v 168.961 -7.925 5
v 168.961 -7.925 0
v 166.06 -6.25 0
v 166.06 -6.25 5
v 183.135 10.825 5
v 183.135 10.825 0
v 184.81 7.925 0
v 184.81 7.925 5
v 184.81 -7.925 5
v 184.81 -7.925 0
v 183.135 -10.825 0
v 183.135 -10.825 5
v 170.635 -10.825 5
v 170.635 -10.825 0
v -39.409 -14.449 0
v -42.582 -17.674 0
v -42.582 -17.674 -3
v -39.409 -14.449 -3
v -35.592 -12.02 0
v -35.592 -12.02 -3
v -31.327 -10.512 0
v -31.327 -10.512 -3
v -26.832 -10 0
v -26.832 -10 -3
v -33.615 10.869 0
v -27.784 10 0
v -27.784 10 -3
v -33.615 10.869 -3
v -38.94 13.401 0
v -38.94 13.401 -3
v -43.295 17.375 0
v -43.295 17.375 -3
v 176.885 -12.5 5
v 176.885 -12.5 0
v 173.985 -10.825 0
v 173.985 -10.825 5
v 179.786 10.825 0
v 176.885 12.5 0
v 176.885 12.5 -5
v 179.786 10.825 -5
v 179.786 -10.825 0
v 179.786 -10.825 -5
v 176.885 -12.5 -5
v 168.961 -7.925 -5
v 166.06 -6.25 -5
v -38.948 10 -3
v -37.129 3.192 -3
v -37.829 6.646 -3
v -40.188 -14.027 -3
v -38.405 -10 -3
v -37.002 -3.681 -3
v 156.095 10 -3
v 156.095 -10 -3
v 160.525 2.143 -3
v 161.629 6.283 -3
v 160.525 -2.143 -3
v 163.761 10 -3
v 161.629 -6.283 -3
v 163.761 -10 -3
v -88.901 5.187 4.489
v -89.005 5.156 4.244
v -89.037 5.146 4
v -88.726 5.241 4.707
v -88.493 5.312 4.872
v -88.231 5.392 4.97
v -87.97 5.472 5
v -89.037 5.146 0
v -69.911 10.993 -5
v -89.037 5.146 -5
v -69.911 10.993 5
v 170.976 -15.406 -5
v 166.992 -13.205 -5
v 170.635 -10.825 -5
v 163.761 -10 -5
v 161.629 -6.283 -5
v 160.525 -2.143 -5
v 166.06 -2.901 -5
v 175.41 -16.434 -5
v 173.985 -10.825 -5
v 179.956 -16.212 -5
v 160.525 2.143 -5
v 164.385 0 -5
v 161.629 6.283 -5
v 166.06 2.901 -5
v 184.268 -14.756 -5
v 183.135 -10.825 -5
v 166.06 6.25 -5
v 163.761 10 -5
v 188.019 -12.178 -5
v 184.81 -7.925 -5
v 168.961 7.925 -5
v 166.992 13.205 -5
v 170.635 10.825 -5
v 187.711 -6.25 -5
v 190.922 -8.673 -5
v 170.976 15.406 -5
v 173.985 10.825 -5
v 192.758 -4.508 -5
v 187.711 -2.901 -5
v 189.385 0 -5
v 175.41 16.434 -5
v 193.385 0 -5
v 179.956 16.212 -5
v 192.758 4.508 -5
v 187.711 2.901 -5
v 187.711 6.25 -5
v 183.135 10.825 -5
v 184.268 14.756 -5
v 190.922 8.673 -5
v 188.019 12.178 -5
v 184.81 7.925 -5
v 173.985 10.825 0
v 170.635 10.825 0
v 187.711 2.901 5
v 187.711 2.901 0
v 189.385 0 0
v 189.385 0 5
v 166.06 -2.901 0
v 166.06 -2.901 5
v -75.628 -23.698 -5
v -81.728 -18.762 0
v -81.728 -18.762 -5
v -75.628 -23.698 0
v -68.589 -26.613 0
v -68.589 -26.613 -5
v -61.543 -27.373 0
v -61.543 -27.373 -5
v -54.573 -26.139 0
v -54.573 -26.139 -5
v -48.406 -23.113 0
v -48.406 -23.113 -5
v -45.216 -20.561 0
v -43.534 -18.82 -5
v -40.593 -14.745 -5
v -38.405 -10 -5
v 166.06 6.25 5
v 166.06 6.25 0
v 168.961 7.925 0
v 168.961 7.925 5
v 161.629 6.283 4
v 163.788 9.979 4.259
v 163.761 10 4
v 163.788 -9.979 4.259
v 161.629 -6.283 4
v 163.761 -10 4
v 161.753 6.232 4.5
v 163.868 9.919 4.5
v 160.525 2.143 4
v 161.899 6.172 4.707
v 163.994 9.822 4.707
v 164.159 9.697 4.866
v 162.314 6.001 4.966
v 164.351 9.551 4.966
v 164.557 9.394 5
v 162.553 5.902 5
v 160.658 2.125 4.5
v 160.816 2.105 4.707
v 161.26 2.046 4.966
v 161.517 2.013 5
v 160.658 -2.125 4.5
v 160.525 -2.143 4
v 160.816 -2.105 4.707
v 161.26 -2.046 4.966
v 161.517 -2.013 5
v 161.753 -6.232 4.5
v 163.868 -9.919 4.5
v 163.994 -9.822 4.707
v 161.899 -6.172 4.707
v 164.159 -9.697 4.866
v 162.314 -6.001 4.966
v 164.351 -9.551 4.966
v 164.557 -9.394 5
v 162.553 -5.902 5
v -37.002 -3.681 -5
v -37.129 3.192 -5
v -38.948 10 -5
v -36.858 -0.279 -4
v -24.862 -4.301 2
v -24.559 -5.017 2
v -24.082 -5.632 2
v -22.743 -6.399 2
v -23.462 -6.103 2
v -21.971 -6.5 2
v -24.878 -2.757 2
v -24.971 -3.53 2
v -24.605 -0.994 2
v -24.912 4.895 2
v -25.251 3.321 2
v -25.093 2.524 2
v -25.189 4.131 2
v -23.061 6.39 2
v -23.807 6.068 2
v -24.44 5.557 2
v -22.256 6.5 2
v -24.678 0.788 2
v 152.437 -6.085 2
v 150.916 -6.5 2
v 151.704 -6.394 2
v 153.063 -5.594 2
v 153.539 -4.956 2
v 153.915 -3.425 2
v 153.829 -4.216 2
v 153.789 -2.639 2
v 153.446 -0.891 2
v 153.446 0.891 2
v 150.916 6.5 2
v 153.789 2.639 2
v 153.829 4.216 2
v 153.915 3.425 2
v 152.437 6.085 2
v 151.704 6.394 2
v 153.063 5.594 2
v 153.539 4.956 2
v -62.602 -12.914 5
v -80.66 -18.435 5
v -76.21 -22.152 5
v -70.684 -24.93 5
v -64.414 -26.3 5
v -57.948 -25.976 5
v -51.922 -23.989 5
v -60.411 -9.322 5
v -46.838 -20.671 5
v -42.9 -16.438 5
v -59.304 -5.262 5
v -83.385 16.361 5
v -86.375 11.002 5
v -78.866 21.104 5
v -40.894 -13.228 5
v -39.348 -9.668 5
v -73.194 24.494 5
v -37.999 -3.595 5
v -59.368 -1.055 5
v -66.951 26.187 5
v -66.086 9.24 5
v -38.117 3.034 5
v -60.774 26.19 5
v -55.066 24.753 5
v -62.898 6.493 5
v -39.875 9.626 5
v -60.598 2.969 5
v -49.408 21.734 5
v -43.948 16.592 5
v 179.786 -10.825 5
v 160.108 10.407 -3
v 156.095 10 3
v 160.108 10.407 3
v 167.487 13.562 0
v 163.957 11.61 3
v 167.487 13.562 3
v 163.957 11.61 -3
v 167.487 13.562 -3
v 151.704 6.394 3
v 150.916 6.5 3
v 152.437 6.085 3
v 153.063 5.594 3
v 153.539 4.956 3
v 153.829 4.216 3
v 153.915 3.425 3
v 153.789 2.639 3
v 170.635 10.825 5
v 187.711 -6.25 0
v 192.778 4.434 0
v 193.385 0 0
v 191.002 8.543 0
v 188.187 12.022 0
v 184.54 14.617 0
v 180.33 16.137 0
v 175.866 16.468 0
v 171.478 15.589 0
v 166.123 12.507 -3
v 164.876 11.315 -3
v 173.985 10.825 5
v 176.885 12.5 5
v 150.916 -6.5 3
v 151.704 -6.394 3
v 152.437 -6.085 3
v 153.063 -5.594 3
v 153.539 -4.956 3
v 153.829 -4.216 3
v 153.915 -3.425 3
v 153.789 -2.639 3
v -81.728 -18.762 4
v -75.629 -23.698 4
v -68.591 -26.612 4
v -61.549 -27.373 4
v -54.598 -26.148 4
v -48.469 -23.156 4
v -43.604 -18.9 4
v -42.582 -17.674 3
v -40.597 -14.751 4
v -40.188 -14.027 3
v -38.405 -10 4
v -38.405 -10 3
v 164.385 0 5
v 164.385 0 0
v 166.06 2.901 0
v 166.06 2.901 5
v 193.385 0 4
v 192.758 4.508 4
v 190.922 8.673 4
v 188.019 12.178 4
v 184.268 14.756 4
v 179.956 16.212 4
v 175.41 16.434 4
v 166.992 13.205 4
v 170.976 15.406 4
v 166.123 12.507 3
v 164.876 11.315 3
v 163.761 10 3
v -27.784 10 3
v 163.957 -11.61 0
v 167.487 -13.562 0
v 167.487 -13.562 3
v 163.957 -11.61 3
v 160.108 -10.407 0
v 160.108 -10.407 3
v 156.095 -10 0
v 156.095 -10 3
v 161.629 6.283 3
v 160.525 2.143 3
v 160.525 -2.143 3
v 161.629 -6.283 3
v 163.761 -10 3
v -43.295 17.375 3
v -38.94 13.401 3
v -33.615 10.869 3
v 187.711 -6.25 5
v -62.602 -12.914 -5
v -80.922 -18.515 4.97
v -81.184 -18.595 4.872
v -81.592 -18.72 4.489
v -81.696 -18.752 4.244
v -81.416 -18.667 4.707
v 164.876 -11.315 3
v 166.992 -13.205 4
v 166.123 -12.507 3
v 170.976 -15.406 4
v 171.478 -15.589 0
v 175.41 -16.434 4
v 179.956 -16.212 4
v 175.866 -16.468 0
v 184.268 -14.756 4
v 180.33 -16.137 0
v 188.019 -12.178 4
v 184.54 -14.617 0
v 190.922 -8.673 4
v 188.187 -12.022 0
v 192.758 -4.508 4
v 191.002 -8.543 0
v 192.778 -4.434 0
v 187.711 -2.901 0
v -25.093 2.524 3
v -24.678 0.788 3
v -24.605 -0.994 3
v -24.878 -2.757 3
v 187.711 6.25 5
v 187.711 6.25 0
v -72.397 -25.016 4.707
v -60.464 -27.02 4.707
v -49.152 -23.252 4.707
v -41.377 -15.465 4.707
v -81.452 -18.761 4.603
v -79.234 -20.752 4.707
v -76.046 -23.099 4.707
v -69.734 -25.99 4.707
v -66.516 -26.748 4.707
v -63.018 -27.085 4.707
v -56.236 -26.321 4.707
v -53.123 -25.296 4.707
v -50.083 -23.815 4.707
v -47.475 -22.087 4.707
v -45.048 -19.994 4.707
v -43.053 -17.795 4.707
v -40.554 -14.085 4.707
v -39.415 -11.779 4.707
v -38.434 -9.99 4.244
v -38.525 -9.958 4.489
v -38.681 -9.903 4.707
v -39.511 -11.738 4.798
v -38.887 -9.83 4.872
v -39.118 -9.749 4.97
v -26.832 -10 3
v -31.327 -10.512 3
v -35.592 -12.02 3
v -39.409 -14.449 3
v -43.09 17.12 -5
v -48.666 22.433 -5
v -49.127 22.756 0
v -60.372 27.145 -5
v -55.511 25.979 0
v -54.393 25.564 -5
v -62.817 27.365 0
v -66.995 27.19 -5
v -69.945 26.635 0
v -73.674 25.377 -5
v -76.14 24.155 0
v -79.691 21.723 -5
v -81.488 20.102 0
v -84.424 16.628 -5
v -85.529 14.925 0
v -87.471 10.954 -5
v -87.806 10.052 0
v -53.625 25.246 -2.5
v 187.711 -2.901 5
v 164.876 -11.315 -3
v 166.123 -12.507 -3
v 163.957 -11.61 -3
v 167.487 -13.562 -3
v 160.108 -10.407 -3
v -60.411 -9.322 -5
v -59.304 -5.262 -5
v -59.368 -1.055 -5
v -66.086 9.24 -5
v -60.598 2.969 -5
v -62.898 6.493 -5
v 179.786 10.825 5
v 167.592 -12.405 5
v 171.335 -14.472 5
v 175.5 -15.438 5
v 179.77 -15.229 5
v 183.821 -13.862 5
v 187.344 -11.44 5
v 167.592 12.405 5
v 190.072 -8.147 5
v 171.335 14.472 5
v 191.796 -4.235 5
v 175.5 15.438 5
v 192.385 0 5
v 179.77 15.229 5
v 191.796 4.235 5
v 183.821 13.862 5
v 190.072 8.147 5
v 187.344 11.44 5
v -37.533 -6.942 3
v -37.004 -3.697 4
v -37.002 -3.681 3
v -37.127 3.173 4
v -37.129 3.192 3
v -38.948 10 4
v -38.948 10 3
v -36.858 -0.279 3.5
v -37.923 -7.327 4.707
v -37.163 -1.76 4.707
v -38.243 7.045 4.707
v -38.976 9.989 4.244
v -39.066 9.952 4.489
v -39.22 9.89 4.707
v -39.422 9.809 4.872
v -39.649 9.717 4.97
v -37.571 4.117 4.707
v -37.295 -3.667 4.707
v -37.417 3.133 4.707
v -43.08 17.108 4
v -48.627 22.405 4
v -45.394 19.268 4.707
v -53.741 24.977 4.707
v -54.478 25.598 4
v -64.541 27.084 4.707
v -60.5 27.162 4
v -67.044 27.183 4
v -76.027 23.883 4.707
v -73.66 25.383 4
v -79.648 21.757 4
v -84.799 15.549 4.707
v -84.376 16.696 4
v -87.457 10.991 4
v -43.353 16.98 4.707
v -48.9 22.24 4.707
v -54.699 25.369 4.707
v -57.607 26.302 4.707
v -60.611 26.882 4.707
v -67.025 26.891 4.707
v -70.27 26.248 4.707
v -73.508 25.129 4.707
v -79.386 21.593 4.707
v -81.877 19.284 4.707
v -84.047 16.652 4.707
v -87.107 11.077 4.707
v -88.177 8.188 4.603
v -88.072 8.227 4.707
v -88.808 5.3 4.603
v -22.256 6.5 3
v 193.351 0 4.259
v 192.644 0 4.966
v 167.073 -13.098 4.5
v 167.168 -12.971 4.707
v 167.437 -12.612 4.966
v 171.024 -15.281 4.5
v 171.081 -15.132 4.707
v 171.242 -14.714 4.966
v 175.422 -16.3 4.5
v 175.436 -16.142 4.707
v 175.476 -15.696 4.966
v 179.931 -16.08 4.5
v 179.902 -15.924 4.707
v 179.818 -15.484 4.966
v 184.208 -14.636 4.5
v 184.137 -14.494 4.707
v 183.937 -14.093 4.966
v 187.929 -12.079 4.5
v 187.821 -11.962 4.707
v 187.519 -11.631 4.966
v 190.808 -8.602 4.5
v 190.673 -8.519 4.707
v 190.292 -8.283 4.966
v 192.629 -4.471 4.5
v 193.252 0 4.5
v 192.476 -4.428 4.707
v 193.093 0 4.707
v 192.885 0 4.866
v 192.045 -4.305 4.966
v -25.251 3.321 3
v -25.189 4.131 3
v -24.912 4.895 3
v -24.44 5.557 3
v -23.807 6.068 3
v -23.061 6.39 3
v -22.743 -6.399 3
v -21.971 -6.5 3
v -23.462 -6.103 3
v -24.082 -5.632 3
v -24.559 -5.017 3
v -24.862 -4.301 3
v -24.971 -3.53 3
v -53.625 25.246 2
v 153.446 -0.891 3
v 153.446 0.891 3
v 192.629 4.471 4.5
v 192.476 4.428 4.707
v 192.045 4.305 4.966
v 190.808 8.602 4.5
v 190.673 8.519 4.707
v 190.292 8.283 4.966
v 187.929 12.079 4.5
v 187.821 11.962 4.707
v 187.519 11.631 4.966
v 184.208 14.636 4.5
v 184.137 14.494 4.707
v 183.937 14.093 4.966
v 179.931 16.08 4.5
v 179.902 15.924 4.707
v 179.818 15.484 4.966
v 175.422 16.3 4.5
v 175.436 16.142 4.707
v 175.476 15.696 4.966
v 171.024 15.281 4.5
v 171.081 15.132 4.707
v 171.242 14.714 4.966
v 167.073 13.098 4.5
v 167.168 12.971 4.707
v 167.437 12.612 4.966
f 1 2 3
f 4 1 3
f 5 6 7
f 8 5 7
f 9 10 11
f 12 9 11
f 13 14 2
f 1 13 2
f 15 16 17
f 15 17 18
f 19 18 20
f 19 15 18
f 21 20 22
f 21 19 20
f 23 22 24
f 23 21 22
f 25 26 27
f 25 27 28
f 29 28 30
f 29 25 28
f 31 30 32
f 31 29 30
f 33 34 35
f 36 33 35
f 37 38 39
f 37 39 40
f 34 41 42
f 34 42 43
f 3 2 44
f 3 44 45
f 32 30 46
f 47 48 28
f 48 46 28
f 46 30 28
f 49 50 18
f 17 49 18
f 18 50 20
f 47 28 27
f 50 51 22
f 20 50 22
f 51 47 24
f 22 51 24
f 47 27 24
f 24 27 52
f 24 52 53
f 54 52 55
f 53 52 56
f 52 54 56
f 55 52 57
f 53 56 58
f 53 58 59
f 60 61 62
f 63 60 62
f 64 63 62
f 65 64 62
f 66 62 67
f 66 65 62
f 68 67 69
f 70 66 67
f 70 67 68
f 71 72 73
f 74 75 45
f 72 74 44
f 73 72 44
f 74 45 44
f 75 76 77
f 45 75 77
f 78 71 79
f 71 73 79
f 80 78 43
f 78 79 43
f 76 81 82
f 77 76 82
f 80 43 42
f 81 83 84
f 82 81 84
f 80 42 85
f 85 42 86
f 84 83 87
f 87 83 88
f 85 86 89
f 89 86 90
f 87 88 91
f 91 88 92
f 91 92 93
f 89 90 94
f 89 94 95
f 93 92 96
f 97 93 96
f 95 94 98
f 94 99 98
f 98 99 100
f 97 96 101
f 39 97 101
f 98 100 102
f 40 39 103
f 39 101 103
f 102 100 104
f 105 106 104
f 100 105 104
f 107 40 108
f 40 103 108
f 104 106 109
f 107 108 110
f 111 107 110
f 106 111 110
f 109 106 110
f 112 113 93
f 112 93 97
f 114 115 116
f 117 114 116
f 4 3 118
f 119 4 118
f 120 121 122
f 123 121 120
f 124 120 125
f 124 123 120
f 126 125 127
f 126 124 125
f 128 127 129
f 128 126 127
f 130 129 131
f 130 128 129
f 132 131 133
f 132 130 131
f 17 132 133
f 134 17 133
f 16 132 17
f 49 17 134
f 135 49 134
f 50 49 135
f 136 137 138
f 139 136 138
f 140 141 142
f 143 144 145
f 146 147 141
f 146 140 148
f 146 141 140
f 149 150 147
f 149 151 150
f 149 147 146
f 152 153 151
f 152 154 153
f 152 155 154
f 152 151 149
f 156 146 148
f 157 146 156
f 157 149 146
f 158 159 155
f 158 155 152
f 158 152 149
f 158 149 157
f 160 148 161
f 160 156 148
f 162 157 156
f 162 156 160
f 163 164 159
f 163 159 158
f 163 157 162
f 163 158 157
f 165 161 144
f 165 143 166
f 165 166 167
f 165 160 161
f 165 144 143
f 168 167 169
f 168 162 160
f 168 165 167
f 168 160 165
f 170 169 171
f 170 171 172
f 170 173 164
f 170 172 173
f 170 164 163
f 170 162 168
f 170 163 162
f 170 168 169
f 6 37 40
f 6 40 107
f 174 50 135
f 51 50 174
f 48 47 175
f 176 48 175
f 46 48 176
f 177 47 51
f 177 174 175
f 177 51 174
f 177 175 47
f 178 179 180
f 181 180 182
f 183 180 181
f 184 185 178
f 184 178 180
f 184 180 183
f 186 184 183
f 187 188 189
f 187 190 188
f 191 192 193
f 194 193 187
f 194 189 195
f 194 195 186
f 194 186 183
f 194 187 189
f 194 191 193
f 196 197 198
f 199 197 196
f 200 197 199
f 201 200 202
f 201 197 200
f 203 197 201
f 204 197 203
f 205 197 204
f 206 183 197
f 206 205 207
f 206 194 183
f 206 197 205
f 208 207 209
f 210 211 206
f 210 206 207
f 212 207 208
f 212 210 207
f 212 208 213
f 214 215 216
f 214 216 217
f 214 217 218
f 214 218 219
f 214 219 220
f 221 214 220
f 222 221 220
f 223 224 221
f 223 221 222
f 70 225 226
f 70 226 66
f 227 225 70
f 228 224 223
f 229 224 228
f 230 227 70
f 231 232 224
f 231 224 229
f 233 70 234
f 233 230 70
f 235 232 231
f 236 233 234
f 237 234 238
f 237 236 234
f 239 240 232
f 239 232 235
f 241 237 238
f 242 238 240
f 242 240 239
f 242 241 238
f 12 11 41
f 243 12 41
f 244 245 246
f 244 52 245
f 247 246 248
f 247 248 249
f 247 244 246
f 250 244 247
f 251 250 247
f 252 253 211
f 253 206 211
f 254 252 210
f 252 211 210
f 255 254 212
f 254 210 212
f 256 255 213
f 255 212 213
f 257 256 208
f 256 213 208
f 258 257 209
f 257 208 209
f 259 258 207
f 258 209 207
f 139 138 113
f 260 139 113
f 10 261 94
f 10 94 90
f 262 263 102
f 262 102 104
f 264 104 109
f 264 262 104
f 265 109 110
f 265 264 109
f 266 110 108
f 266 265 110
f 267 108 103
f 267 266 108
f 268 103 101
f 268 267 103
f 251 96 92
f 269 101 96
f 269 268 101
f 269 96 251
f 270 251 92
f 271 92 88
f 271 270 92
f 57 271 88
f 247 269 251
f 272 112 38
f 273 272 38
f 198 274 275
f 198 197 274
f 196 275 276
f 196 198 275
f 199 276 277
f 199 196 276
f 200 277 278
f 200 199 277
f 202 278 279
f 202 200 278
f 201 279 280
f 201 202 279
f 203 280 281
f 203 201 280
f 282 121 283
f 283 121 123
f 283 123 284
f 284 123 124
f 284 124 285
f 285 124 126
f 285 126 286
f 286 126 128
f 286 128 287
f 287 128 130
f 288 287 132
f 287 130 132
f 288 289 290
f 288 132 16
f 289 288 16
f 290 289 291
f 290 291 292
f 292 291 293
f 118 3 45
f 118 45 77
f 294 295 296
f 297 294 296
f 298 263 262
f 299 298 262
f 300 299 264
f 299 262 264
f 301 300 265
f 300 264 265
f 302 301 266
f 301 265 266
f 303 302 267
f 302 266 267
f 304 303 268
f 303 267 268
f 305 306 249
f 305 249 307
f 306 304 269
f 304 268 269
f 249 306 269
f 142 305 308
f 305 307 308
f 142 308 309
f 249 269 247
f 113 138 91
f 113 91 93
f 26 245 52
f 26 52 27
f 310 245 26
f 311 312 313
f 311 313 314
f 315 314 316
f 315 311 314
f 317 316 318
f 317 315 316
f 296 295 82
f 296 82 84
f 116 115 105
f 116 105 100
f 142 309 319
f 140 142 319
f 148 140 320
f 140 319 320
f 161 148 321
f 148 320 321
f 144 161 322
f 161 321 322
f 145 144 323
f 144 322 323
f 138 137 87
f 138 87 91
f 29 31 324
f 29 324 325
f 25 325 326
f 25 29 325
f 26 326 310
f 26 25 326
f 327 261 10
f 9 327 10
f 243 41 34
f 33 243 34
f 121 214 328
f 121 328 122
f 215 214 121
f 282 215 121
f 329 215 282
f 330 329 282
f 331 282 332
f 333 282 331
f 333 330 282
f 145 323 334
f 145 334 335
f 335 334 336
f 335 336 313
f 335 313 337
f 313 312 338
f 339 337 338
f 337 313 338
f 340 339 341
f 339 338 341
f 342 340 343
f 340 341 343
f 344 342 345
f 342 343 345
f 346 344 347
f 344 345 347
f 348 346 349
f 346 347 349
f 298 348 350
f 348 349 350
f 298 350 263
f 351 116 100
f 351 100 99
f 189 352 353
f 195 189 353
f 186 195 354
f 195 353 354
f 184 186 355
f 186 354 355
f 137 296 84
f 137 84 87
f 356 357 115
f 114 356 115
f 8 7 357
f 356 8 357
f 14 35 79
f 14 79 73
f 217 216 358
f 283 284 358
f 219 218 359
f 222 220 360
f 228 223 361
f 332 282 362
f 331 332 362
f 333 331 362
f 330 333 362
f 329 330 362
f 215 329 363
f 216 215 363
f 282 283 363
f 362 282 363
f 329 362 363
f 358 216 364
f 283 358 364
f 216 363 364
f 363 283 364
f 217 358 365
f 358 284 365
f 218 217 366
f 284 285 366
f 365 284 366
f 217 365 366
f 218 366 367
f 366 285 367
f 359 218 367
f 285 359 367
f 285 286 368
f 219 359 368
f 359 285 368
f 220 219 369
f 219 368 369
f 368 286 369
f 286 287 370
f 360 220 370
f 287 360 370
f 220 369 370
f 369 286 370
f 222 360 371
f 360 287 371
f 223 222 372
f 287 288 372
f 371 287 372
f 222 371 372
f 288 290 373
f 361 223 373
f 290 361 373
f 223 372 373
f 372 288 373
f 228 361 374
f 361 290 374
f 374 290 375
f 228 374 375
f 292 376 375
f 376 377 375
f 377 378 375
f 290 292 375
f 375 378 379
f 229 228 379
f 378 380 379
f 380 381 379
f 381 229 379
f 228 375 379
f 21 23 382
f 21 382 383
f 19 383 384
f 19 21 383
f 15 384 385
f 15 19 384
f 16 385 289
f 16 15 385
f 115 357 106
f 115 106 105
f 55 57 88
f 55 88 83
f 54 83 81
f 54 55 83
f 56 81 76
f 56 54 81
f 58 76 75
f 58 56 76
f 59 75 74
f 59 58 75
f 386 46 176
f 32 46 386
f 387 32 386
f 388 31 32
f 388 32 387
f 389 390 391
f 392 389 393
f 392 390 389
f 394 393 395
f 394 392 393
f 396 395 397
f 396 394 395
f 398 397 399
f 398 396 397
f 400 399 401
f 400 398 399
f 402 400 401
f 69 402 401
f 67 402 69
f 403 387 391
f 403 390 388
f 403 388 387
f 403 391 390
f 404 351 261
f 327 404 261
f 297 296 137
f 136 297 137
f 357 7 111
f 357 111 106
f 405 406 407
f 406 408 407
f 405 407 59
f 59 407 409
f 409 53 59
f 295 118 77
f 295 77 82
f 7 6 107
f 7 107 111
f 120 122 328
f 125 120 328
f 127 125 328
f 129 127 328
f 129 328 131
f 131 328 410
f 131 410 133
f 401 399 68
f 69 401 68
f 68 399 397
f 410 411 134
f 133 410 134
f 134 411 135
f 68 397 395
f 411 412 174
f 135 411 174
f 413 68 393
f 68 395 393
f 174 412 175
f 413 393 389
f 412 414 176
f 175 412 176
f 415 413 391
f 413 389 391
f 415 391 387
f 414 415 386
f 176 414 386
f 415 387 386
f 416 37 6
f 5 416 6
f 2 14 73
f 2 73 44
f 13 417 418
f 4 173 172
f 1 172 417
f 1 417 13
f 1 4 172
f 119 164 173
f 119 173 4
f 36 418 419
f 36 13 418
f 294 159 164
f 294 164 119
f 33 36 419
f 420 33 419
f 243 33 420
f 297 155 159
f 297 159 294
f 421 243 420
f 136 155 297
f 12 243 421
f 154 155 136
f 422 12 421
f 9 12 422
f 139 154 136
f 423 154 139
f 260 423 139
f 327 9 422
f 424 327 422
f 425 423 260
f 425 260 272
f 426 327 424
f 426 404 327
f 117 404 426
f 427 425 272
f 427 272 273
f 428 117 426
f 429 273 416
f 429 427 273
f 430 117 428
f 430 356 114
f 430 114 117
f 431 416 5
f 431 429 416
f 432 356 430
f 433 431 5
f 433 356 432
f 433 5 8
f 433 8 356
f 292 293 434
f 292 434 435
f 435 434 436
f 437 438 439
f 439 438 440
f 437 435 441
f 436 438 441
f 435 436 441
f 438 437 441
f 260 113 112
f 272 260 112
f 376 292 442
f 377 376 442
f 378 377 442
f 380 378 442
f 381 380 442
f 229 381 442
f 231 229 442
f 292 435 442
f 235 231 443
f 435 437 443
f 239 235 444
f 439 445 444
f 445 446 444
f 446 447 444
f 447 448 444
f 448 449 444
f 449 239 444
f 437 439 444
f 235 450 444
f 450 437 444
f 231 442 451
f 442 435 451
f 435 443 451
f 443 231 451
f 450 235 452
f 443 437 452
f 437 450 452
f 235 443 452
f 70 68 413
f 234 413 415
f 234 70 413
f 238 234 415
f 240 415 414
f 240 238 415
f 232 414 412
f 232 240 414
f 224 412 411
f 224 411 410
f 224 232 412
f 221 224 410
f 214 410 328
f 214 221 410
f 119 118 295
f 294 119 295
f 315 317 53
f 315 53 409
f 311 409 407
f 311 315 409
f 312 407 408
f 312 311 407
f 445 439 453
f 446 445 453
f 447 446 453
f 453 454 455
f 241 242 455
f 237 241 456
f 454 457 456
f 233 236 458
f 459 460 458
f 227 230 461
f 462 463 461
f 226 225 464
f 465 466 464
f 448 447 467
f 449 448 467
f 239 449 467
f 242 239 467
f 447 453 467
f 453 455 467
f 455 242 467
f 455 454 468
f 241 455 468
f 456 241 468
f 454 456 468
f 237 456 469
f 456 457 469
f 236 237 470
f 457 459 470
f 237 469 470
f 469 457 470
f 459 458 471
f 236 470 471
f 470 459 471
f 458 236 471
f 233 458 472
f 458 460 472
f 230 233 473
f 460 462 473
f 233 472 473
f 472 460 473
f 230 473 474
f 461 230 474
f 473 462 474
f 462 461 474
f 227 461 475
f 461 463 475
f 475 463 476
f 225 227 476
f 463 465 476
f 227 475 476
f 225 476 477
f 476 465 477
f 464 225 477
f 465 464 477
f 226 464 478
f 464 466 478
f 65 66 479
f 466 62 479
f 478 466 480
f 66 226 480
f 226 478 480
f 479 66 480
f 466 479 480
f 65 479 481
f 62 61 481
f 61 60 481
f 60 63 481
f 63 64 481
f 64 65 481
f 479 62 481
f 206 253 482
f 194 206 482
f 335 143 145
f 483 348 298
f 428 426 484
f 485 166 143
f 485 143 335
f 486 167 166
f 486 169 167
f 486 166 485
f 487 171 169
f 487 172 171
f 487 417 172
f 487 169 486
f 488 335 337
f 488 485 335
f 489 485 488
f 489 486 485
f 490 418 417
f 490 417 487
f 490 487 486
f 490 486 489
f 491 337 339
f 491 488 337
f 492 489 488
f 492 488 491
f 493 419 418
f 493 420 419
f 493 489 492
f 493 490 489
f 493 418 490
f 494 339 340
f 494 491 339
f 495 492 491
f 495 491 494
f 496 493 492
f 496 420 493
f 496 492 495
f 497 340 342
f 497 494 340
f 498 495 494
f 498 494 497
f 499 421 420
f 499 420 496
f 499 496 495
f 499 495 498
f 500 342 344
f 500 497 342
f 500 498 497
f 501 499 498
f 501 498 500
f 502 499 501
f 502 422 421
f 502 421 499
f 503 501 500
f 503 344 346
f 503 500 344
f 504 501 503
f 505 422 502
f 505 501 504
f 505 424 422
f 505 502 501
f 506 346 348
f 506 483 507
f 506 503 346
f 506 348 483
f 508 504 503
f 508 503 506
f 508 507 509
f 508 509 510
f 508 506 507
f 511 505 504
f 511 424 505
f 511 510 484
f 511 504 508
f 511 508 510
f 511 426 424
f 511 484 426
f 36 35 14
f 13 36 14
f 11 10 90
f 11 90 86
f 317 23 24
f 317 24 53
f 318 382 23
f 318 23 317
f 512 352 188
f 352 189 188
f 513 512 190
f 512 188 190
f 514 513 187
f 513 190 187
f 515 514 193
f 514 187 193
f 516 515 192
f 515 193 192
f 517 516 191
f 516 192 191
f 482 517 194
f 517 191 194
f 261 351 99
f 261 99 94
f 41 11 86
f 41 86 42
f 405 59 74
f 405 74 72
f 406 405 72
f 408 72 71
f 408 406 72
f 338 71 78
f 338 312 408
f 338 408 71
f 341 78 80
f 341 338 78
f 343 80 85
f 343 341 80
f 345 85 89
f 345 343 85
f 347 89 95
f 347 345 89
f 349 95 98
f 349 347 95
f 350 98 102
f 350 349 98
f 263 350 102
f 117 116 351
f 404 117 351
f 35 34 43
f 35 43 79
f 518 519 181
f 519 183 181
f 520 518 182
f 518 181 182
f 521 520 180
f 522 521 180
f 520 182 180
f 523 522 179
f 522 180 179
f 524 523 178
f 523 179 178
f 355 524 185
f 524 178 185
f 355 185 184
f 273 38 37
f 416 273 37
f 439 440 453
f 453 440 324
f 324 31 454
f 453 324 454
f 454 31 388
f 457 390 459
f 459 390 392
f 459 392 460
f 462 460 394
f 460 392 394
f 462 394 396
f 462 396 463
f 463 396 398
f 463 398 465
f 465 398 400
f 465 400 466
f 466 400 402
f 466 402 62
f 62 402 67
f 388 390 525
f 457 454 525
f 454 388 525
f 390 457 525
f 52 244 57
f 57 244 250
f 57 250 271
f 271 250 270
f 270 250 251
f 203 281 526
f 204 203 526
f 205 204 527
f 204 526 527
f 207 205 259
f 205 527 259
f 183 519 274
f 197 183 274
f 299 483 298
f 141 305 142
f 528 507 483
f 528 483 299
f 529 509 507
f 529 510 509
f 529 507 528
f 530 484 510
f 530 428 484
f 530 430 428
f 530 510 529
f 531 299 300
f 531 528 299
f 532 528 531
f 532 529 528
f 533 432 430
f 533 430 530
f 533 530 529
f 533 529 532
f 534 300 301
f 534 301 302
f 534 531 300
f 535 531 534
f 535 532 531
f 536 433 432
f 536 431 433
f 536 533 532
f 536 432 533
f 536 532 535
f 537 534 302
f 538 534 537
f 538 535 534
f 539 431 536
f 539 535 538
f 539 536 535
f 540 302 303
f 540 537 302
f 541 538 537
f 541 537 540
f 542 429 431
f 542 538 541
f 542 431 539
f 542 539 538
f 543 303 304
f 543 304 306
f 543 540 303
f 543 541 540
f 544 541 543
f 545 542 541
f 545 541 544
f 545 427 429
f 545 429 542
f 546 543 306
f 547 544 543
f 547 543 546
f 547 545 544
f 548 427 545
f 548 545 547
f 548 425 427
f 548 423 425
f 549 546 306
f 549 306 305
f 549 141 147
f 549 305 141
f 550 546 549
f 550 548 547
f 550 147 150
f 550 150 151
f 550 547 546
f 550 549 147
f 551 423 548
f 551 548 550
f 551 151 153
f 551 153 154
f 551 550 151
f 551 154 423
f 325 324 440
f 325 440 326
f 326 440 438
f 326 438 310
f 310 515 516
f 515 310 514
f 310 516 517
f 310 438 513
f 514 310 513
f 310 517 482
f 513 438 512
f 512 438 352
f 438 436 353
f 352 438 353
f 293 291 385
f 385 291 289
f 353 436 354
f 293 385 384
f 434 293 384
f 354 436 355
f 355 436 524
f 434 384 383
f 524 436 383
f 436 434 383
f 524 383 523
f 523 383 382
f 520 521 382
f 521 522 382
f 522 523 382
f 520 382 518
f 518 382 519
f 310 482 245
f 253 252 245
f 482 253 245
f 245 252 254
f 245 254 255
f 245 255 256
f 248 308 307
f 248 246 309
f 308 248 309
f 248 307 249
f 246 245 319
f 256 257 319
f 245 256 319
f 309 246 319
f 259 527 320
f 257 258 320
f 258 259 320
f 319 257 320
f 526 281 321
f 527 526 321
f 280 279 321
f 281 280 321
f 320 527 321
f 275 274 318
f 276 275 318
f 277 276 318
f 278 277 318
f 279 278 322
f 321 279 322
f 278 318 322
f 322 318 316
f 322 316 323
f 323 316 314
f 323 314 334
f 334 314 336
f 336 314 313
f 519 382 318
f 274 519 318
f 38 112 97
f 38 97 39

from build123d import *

# Parameters (mm, degrees)
BOSS_EXTRUDE1_DEPTH   = 5
BOSS_EXTRUDE1_2_DEPTH = 5
BOSS_EXTRUDE2_DEPTH   = 3
FILLET1_R             = 20
FILLET2_R             = 20
CUT_EXTRUDE2_DEPTH    = 1
FILLET3_R             = 3
FILLET4_R             = 1


with BuildPart() as part:
    # Sketch1 → Boss-Extrude1 (new, symmetric)
    with BuildSketch(Plane.XY):
        with BuildLine():
            Line((-89.037246537, 5.145771556), (-69.911151418, 10.99320565))
            ThreePointArc((-69.911151418, 10.99320565), (-59.841193921, 1.000753662), (-62.6018588, -12.914413249))
            Line((-62.6018588, -12.914413249), (-81.727953919, -18.761847343))
            add(Edge.make_bspline(
                [(-81.727953919, -18.761847343), (-58.860884109, -43.388050907), (-41.130092768, -15.622946309), (-39.447011057, -12.987365142), (-38.405002213, -10)],
                knots=[2.042658164, 2.042658164, 2.042658164, 3.822478708, 3.822478708, 4.076668665, 4.076668665, 4.076668665], degree=2, weights=[1, 0.629481749, 1, 0.947083419, 0.909281691]))
            add(Edge.make_bspline(
                [(-38.405002213, -10), (-34.916949048, 0), (-38.94800166, 10)],
                knots=[4.076668665, 4.076668665, 4.076668665, 4.797306531, 4.797306531, 4.797306531], degree=2, weights=[0.909281691, 0.802112405, 0.816427746]))
            add(Edge.make_bspline(
                [(-38.94800166, 10), (-43.286972227, 20.763864888), (-53.624843095, 25.245540515), (-83.850384762, 38.348922741), (-89.037246537, 5.145771556)],
                knots=[4.797306531, 4.797306531, 4.797306531, 5.602299252, 5.602299252, 7.382119797, 7.382119797, 7.382119797], degree=2, weights=[0.816427746, 0.832418782, 1, 0.629481749, 1]))
        make_face()
    extrude(amount=BOSS_EXTRUDE1_DEPTH, both=True)



with BuildPart() as body_2:
    # Sketch1 → Boss-Extrude1 2 (new, symmetric)
    with BuildSketch(Plane.XY):
        with BuildLine():
            ThreePointArc((193.385488342, 0), (182.162671381, 15.633340627), (163.761083594, 10))
            ThreePointArc((163.761083594, 10), (160.385488342, 0), (163.761083594, -10))
            ThreePointArc((163.761083594, -10), (182.162671381, -15.633340627), (193.385488342, 0))
        make_face()
        Polygon((170.635488342, 10.825317547), (173.984853248, 10.825317547), (176.885488342, 12.5), (179.786123437, 10.825317547), (183.135488342, 10.825317547), (184.810170795, 7.924682453), (187.71080589, 6.25), (187.71080589, 2.900635095), (189.385488342, 0), (187.71080589, -2.900635095), (187.71080589, -6.25), (184.810170795, -7.924682453), (183.135488342, -10.825317547), (179.786123437, -10.825317547), (176.885488342, -12.5), (173.984853248, -10.825317547), (170.635488342, -10.825317547), (168.96080589, -7.924682453), (166.060170795, -6.25), (166.060170795, -2.900635095), (164.385488342, 0), (166.060170795, 2.900635095), (166.060170795, 6.25), (168.96080589, 7.924682453), align=None, mode=Mode.SUBTRACT)
    extrude(amount=BOSS_EXTRUDE1_2_DEPTH, both=True)


with BuildPart() as part_1:
    add(part.part)

    add(body_2.part)  # Boss-Extrude2 merges body 2
    # Sketch1<4> → Boss-Extrude2 (add, symmetric)
    with BuildSketch(Plane.XY):
        with BuildLine():
            Line((163.761083594, 10), (-38.94800166, 10))
            add(Edge.make_bspline(
                [(-38.405002213, -10), (-34.916949048, 0), (-38.94800166, 10)],
                knots=[4.076668665, 4.076668665, 4.076668665, 4.797306531, 4.797306531, 4.797306531], degree=2, weights=[0.909281691, 0.802112405, 0.816427746]))
            Line((-38.405002213, -10), (163.761083594, -10))
            ThreePointArc((163.761083594, -10), (160.385488342, 0), (163.761083594, 10))
        make_face()
    extrude(amount=BOSS_EXTRUDE2_DEPTH, both=True)

    # Fillet1
    # the kernel refuses this fillet: 20 mm, written as the material it adds along each edge
    with BuildSketch(Plane(origin=(-38.94800166, 10, 0), x_dir=(-0.507799469280601, 0.8614753037657783, 0), z_dir=(0, 0, -1))) as fillet1_piece_1:
        with BuildLine():
            CenterArc((11.560223387, 19.773854944), FILLET1_R, 210.517364345, 50.858287997)
            Line((-5.669282689, 9.617865559), (-6.01387281, 9.414745771))
            Line((-6.01387281, 9.414745771), (-0.344590122, -0.203119788))
            Line((-0.344590122, -0.203119788), (0.059556935, -0.395541365))
            ThreePointArc((0.059556935, -0.395541365), (4.280578149, -0.078560147), (8.501131211, -0.395477099))
            Line((8.501131211, -0.395477099), (8.561113411, 0))
        make_face()
    fillet1_piece_1_solid = extrude(amount=3, mode=Mode.PRIVATE)
    with BuildSketch(Plane(origin=(-38.405002213, -10, 0), x_dir=(-0.4780913374533499, -0.8783101235053977, 0), z_dir=(0, 0, 1))) as fillet1_piece_2:
        with BuildLine():
            CenterArc((12.033263145, 19.726488271), FILLET1_R, 208.560818285, 51.952664674)
            Line((-5.532939325, 10.164661522), (-5.884263374, 9.973424987))
            Line((-5.884263374, 9.973424987), (-0.351324049, -0.191236535))
            Line((-0.351324049, -0.191236535), (0.064860434, -0.394706377))
            ThreePointArc((0.064860434, -0.394706377), (4.368504422, -0.040514317), (8.671026811, -0.394529765))
            Line((8.671026811, -0.394529765), (8.736953014, 0))
        make_face()
    fillet1_piece_2_solid = extrude(amount=3, mode=Mode.PRIVATE)
    with BuildSketch(Plane(origin=(-38.405002213, -10, 0), x_dir=(-0.4780913374533499, -0.8783101235053977, 0), z_dir=(0, 0, -1))) as fillet1_piece_3:
        with BuildLine():
            CenterArc((12.033263145, -19.726488271), FILLET1_R, 99.486517041, 51.952664674)
            Line((-5.532939325, -10.164661522), (-5.884263374, -9.973424987))
            Line((-5.884263374, -9.973424987), (-0.351324049, 0.191236535))
            Line((-0.351324049, 0.191236535), (0.064860434, 0.394706377))
            ThreePointArc((0.064860434, 0.394706377), (4.368504422, 0.040514317), (8.671026811, 0.394529765))
            Line((8.671026811, 0.394529765), (8.736953014, 0))
        make_face()
    fillet1_piece_3_solid = extrude(amount=3, mode=Mode.PRIVATE)
    with BuildSketch(Plane(origin=(-38.94800166, 10, 0), x_dir=(-0.507799469280601, 0.8614753037657783, 0), z_dir=(0, 0, 1))) as fillet1_piece_4:
        with BuildLine():
            CenterArc((11.560223387, -19.773854944), FILLET1_R, 98.624347659, 50.858287997)
            Line((-5.669282689, -9.617865559), (-6.01387281, -9.414745771))
            Line((-6.01387281, -9.414745771), (-0.344590122, 0.203119788))
            Line((-0.344590122, 0.203119788), (0.059556935, 0.395541365))
            ThreePointArc((0.059556935, 0.395541365), (4.280578149, 0.078560147), (8.501131211, 0.395477099))
            Line((8.501131211, 0.395477099), (8.561113411, 0))
        make_face()
    fillet1_piece_4_solid = extrude(amount=3, mode=Mode.PRIVATE)
    add([fillet1_piece_1_solid, fillet1_piece_2_solid, fillet1_piece_3_solid, fillet1_piece_4_solid])

    # Fillet2
    # the kernel refuses this fillet: 20 mm, written as the material it adds along each edge
    with BuildSketch(Plane(origin=(163.761083594, -10, 0), x_dir=(0.7228612548390331, -0.6909932027542227, 0), z_dir=(0, 0, -1))) as fillet2_piece_1:
        with BuildLine():
            CenterArc((8.278251992, 19.754529721), FILLET2_R, 226.291219019, 34.722762927)
            Line((-5.541612063, 5.297304624), (0, 0))
            ThreePointArc((0, 0), (2.577191658, 0.20251298), (5.154383316, 0))
        make_face()
    extrude(amount=3)
    with BuildSketch(Plane(origin=(163.761083594, 10, 0), x_dir=(-1, 0, 0), z_dir=(0, 0, -1)), Plane(origin=(163.761083594, -10, 0), x_dir=(-1, 0, 0), z_dir=(0, 0, 1))) as fillet2_piece_2:
        with BuildLine():
            CenterArc((7.666218138, 20), FILLET2_R, 235.277237073, 34.722762927)
            ThreePointArc((-3.725903992, 3.561643836), (-1.723016903, 1.927210705), (0, 0))
            Line((0, 0), (7.666218138, 0))
        make_face()
    extrude(amount=3)
    with BuildSketch(Plane(origin=(163.761083594, 10, 0), x_dir=(-1, 0, 0), z_dir=(0, 0, 1))) as fillet2_piece_3:
        with BuildLine():
            CenterArc((7.666218138, -20), FILLET2_R, 90, 34.722762927)
            ThreePointArc((-3.725903992, -3.561643836), (-1.723016903, -1.927210705), (0, 0))
            Line((0, 0), (7.666218138, 0))
        make_face()
    extrude(amount=3)

    # Sketch4 → Cut-Extrude2 (cut)
    with BuildSketch(Plane.XY.offset(3)):
        with BuildLine():
            Line((156.094865456, 6.5), (-27.783589266, 6.5))
            ThreePointArc((-27.783589266, 6.5), (-24.615419845, 0.197075053), (-26.832026734, -6.5))
            Line((-26.832026734, -6.5), (156.094865456, -6.5))
            ThreePointArc((156.094865456, -6.5), (153.402477301, 0), (156.094865456, 6.5))
        make_face()
    extrude(amount=-CUT_EXTRUDE2_DEPTH, mode=Mode.SUBTRACT)

    # Fillet3
    fillet3_edges = [part_1.edges().sort_by_distance(p)[0] for p in [
        (-27.783589266, 6.5, 2.5),
        (156.094865456, 6.5, 2.5),
        (156.094865456, -6.5, 2.5),
        (-26.832026734, -6.5, 2.5),
    ]]
    fillet(fillet3_edges, radius=FILLET3_R)

    # Fillet4
    fillet4_edges = [part_1.edges().sort_by_distance(p)[0] for p in [
        (-36.865276066, 0.047607181, 5),
        (182.162671381, 15.633340627, 5),
    ]]
    fillet(fillet4_edges, radius=FILLET4_R)


solid = part_1.part
